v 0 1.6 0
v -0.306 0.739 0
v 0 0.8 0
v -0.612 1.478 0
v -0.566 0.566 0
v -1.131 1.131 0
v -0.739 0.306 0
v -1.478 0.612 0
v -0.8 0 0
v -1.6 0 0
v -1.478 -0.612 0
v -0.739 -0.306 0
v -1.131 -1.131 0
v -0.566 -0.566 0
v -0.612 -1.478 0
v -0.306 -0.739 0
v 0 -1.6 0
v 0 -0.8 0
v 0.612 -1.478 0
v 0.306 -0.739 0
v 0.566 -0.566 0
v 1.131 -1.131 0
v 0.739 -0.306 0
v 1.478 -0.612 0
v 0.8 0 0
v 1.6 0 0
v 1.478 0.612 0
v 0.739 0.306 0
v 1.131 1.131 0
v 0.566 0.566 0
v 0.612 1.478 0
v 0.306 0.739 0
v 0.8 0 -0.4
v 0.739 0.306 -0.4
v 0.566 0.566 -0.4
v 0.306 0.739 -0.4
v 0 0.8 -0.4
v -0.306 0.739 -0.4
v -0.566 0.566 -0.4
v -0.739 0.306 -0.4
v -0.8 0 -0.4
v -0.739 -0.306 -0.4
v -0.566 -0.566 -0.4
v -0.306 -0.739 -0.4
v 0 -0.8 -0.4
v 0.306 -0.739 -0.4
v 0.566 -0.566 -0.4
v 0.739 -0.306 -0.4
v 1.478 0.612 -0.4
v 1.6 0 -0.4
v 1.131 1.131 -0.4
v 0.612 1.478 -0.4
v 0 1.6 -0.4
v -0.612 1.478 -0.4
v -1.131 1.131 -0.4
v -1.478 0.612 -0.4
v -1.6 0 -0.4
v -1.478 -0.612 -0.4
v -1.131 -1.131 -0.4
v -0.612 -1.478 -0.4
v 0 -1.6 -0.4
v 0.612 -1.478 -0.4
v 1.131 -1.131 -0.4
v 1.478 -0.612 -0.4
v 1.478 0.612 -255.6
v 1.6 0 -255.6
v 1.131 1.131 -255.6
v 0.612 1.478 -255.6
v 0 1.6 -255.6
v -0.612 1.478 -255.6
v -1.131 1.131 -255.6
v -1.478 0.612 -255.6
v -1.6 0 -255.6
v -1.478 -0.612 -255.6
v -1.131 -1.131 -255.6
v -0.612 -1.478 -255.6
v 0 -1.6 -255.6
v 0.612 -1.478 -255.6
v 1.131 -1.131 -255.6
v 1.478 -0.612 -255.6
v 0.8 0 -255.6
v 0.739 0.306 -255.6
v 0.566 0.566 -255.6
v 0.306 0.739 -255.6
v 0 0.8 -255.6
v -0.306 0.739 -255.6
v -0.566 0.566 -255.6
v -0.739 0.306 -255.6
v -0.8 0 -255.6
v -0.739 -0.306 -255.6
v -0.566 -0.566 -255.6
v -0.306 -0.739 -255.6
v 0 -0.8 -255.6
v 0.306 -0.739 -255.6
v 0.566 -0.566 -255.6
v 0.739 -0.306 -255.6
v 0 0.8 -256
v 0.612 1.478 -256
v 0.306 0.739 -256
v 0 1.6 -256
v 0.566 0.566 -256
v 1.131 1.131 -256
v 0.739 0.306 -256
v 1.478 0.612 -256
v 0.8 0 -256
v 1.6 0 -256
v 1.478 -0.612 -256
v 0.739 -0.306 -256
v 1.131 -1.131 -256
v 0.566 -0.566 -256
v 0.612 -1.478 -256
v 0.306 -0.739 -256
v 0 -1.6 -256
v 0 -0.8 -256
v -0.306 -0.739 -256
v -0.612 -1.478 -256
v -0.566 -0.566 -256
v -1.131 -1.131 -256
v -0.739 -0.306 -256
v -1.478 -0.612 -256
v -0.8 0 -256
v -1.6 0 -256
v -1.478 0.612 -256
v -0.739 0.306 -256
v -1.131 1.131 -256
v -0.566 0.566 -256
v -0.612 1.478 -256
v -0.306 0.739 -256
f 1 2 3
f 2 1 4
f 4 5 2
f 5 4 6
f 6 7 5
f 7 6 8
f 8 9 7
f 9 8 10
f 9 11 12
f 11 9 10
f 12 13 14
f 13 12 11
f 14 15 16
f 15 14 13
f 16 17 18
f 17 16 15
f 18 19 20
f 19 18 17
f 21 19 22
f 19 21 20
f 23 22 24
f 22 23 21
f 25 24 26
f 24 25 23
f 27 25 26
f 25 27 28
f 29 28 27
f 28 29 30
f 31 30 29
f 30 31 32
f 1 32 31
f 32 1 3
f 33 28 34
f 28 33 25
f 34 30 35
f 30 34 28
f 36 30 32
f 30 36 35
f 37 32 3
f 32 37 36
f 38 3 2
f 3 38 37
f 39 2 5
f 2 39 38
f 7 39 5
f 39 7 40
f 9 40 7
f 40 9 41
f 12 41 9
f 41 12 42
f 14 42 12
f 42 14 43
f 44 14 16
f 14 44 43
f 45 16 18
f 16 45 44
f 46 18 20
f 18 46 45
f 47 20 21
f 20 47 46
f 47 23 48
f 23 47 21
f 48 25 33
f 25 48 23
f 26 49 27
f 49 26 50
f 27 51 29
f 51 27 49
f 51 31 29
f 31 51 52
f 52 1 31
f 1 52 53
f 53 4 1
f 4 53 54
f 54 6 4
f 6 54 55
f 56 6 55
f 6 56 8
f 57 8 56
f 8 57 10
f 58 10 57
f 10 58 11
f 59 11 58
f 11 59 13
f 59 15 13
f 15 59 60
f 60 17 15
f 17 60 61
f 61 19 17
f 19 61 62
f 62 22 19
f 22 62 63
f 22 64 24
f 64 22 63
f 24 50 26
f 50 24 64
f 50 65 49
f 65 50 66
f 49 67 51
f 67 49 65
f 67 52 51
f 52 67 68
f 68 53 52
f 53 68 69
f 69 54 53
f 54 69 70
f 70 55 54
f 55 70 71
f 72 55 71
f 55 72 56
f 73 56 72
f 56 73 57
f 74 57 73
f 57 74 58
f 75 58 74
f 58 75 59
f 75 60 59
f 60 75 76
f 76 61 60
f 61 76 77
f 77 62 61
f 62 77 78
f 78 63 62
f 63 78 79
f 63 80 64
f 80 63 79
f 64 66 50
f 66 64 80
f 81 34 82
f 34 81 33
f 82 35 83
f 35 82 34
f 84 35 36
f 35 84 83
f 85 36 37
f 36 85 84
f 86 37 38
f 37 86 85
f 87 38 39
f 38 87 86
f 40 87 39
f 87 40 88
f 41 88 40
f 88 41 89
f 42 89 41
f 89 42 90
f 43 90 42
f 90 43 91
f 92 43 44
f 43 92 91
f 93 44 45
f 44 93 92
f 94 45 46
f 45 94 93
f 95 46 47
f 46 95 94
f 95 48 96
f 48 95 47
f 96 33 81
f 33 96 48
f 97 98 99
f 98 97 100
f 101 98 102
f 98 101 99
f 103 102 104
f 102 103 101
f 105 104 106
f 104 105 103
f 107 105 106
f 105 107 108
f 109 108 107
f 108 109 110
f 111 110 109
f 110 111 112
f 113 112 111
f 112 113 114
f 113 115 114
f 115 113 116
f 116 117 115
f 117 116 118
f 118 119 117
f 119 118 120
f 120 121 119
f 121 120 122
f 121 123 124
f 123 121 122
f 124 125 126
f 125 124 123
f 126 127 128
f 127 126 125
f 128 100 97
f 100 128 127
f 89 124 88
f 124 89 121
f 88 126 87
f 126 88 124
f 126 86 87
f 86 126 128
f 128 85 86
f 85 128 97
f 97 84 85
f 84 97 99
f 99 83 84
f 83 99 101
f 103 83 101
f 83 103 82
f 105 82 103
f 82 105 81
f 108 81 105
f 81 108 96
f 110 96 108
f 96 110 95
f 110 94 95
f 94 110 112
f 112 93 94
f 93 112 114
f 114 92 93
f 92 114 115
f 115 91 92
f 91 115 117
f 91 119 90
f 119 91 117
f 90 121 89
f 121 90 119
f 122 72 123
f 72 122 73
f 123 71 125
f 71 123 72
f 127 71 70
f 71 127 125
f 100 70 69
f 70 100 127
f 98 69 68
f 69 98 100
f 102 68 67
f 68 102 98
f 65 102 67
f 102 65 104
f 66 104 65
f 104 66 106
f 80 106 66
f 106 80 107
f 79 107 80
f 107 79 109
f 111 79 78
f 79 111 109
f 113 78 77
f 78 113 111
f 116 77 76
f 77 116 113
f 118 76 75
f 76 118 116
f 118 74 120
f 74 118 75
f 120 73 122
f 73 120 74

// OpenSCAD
// file: ../p/4-4ring1.scad
use <../lib.scad>
function ldraw_lib__4_4ring1() = [
// 0 Ring  1 x 1.0
// 0 Name: 4-4ring1.dat
// 0 Author: James Jessiman
// 0 !LDRAW_ORG Primitive UPDATE 2009-01
// 0 !LICENSE Licensed under CC BY 2.0 and CC BY 4.0 : see CAreadme.txt
// 
// 0 BFC CERTIFY CCW
  [0,"BFC","CERTIFY"],
  [0,"BFC","CCW"],
// 
// 0 !HISTORY 1998-12-15 [PTadmin] Official Update 1998-10
// 0 !HISTORY 2002-04-08 [BrickCaster] Modified for BFC compliance
// 0 !HISTORY 2002-04-25 [PTadmin] Official Update 2002-02
// 0 !HISTORY 2007-06-24 [PTadmin] Header formatted for Contributor Agreement
// 0 !HISTORY 2008-07-01 [PTadmin] Official Update 2008-01
// 0 !HISTORY 2008-08-26 [cwdee] Switch polygon winding and rename
// 0 !HISTORY 2009-05-02 [PTadmin] Official Update 2009-01
// 
// 
// 4 16 -0.7654 0 1.8478 -0.3827 0 0.9239 0 0 1 0 0 2
  [4,16,-0.7654,0,1.8478,-0.3827,0,0.9239,0,0,1,0,0,2],
// 4 16 -1.4142 0 1.4142 -0.7071 0 0.7071 -0.3827 0 0.9239 -0.7654 0 1.8478
  [4,16,-1.4142,0,1.4142,-0.7071,0,0.7071,-0.3827,0,0.9239,-0.7654,0,1.8478],
// 4 16 -1.8478 0 0.7654 -0.9239 0 0.3827 -0.7071 0 0.7071 -1.4142 0 1.41420
  [4,16,-1.8478,0,0.7654,-0.9239,0,0.3827,-0.7071,0,0.7071,-1.4142,0,1.41420],
// 4 16 -2 0 0 -1 0 0 -0.9239 0 0.3827 -1.8478 0 0.7654
  [4,16,-2,0,0,-1,0,0,-0.9239,0,0.3827,-1.8478,0,0.7654],
// 4 16 -1.8478 0 -0.7654 -0.9239 0 -0.3827 -1 0 0 -2 0 0
  [4,16,-1.8478,0,-0.7654,-0.9239,0,-0.3827,-1,0,0,-2,0,0],
// 4 16 -1.4142 0 -1.4142 -0.7071 0 -0.7071 -0.9239 0 -0.3827 -1.8478 0 -0.7654
  [4,16,-1.4142,0,-1.4142,-0.7071,0,-0.7071,-0.9239,0,-0.3827,-1.8478,0,-0.7654],
// 4 16 -0.7654 0 -1.8478 -0.3827 0 -0.9239 -0.7071 0 -0.7071 -1.4142 0 -1.4142
  [4,16,-0.7654,0,-1.8478,-0.3827,0,-0.9239,-0.7071,0,-0.7071,-1.4142,0,-1.4142],
// 4 16 0 0 -2 0 0 -1 -0.3827 0 -0.9239 -0.7654 0 -1.8478
  [4,16,0,0,-2,0,0,-1,-0.3827,0,-0.9239,-0.7654,0,-1.8478],
// 4 16 0.7654 0 -1.8478 0.3827 0 -0.9239 0 0 -1 0 0 -2
  [4,16,0.7654,0,-1.8478,0.3827,0,-0.9239,0,0,-1,0,0,-2],
// 4 16 1.4142 0 -1.4142 0.7071 0 -0.7071 0.3827 0 -0.9239 0.7654 0 -1.8478
  [4,16,1.4142,0,-1.4142,0.7071,0,-0.7071,0.3827,0,-0.9239,0.7654,0,-1.8478],
// 4 16 1.8478 0 -0.7654 0.9239 0 -0.3827 0.7071 0 -0.7071 1.4142 0 -1.4142
  [4,16,1.8478,0,-0.7654,0.9239,0,-0.3827,0.7071,0,-0.7071,1.4142,0,-1.4142],
// 4 16 2 0 0 1 0 0 0.9239 0 -0.3827 1.8478 0 -0.7654
  [4,16,2,0,0,1,0,0,0.9239,0,-0.3827,1.8478,0,-0.7654],
// 4 16 1.8478 0 0.7654 0.9239 0 0.3827 1 0 0 2 0 0
  [4,16,1.8478,0,0.7654,0.9239,0,0.3827,1,0,0,2,0,0],
// 4 16 1.4142 0 1.4142 0.7071 0 0.7071 0.9239 0 0.3827 1.8478 0 0.7654
  [4,16,1.4142,0,1.4142,0.7071,0,0.7071,0.9239,0,0.3827,1.8478,0,0.7654],
// 4 16 0.7654 0 1.8478 0.3827 0 0.9239 0.7071 0 0.7071 1.4142 0 1.4142
  [4,16,0.7654,0,1.8478,0.3827,0,0.9239,0.7071,0,0.7071,1.4142,0,1.4142],
// 4 16 0 0 2 0 0 1 0.3827 0 0.9239 0.7654 0 1.8478
  [4,16,0,0,2,0,0,1,0.3827,0,0.9239,0.7654,0,1.8478],
// 0
];
module ldraw_lib__4_4ring1(step=0, col=false, unit=2/5, alt=false, line=0.2, solid=!$preview)
    makepoly(ldraw_lib__4_4ring1(), step=step, col=col, unit=unit, alt=alt, line=line, solid=solid);
ldraw_lib__4_4ring1(line=0.2);
// file: ../p/4-4edge.scad
use <../lib.scad>
function ldraw_lib__4_4edge() = [
// 0 Circle 1.0
// 0 Name: 4-4edge.dat
// 0 Author: James Jessiman
// 0 !LDRAW_ORG Primitive UPDATE 2017-01
// 0 !LICENSE Licensed under CC BY 4.0 : see CAreadme.txt
// 
// 0 BFC CERTIFY CCW
  [0,"BFC","CERTIFY"],
  [0,"BFC","CCW"],
// 
// 0 !HISTORY 1998-12-15 [PTadmin] Official Update 1998-10
// 0 !HISTORY 2005-12-28 [PTadmin] Official Update 2005-01
// 0 !HISTORY 2007-06-24 [PTadmin] Header formatted for Contributor Agreement
// 0 !HISTORY 2008-07-01 [PTadmin] Official Update 2008-01
// 0 !HISTORY 2017-01-15 [Steffen] BFCed
// 0 !HISTORY 2017-12-30 [PTadmin] Official Update 2017-01
// 
// 
// 2 24 1 0 0 0.9239 0 0.3827
  [2,24,1,0,0,0.9239,0,0.3827],
// 2 24 0.9239 0 0.3827 0.7071 0 0.7071
  [2,24,0.9239,0,0.3827,0.7071,0,0.7071],
// 2 24 0.7071 0 0.7071 0.3827 0 0.9239
  [2,24,0.7071,0,0.7071,0.3827,0,0.9239],
// 2 24 0.3827 0 0.9239 0 0 1
  [2,24,0.3827,0,0.9239,0,0,1],
// 2 24 0 0 1 -0.3827 0 0.9239
  [2,24,0,0,1,-0.3827,0,0.9239],
// 2 24 -0.3827 0 0.9239 -0.7071 0 0.7071
  [2,24,-0.3827,0,0.9239,-0.7071,0,0.7071],
// 2 24 -0.7071 0 0.7071 -0.9239 0 0.3827
  [2,24,-0.7071,0,0.7071,-0.9239,0,0.3827],
// 2 24 -0.9239 0 0.3827 -1 0 -0
  [2,24,-0.9239,0,0.3827,-1,0,-0],
// 2 24 -1 0 -0 -0.9239 0 -0.3827
  [2,24,-1,0,-0,-0.9239,0,-0.3827],
// 2 24 -0.9239 0 -0.3827 -0.7071 0 -0.7071
  [2,24,-0.9239,0,-0.3827,-0.7071,0,-0.7071],
// 2 24 -0.7071 0 -0.7071 -0.3827 0 -0.9239
  [2,24,-0.7071,0,-0.7071,-0.3827,0,-0.9239],
// 2 24 -0.3827 0 -0.9239 0 0 -1
  [2,24,-0.3827,0,-0.9239,0,0,-1],
// 2 24 0 0 -1 0.3827 0 -0.9239
  [2,24,0,0,-1,0.3827,0,-0.9239],
// 2 24 0.3827 0 -0.9239 0.7071 0 -0.7071
  [2,24,0.3827,0,-0.9239,0.7071,0,-0.7071],
// 2 24 0.7071 0 -0.7071 0.9239 0 -0.3827
  [2,24,0.7071,0,-0.7071,0.9239,0,-0.3827],
// 2 24 0.9239 0 -0.3827 1 0 0
  [2,24,0.9239,0,-0.3827,1,0,0],
];
module ldraw_lib__4_4edge(step=0, col=false, unit=2/5, alt=false, line=0.2, solid=!$preview)
    makepoly(ldraw_lib__4_4edge(), step=step, col=col, unit=unit, alt=alt, line=line, solid=solid);
ldraw_lib__4_4edge(line=0.2);
// file: ../p/4-4cyli.scad
use <../lib.scad>
function ldraw_lib__4_4cyli() = [
// 0 Cylinder 1.0
// 0 Name: 4-4cyli.dat
// 0 Author: James Jessiman
// 0 !LDRAW_ORG Primitive UPDATE 2005-01
// 0 !LICENSE Licensed under CC BY 2.0 and CC BY 4.0 : see CAreadme.txt
// 
// 0 BFC CERTIFY CCW
  [0,"BFC","CERTIFY"],
  [0,"BFC","CCW"],
// 
// 0 !HISTORY 1998-12-15 [PTadmin] Official Update 1998-10
// 0 !HISTORY 2002-03-23 [sbliss] Added BFC statement; merged headers from files in distributions LDraw 0.27 and Complete.
// 0 !HISTORY 2002-04-25 [PTadmin] Official Update 2002-02
// 0 !HISTORY 2004-12-14 [guyvivan] BFC CCW
// 0 !HISTORY 2005-12-28 [PTadmin] Official Update 2005-01
// 0 !HISTORY 2007-06-24 [PTadmin] Header formatted for Contributor Agreement
// 0 !HISTORY 2008-07-01 [PTadmin] Official Update 2008-01
// 
// 
// 4 16 1 1 0 0.9239 1 0.3827 0.9239 0 0.3827 1 0 0
  [4,16,1,1,0,0.9239,1,0.3827,0.9239,0,0.3827,1,0,0],
// 5 24 1 0 0 1 1 0 0.9239 0 0.3827 0.9239 0 -0.3827
  [5,24,1,0,0,1,1,0,0.9239,0,0.3827,0.9239,0,-0.3827],
// 4 16 0.9239 1 0.3827 0.7071 1 0.7071 0.7071 0 0.7071 0.9239 0 0.3827
  [4,16,0.9239,1,0.3827,0.7071,1,0.7071,0.7071,0,0.7071,0.9239,0,0.3827],
// 5 24 0.9239 0 0.3827 0.9239 1 0.3827 0.7071 0 0.7071 1 0 0
  [5,24,0.9239,0,0.3827,0.9239,1,0.3827,0.7071,0,0.7071,1,0,0],
// 4 16 0.7071 1 0.7071 0.3827 1 0.9239 0.3827 0 0.9239 0.7071 0 0.7071
  [4,16,0.7071,1,0.7071,0.3827,1,0.9239,0.3827,0,0.9239,0.7071,0,0.7071],
// 5 24 0.7071 0 0.7071 0.7071 1 0.7071 0.3827 0 0.9239 0.9239 0 0.3827
  [5,24,0.7071,0,0.7071,0.7071,1,0.7071,0.3827,0,0.9239,0.9239,0,0.3827],
// 4 16 0.3827 1 0.9239 0 1 1 0 0 1 0.3827 0 0.9239
  [4,16,0.3827,1,0.9239,0,1,1,0,0,1,0.3827,0,0.9239],
// 5 24 0.3827 0 0.9239 0.3827 1 0.9239 0 0 1 0.7071 0 0.7071
  [5,24,0.3827,0,0.9239,0.3827,1,0.9239,0,0,1,0.7071,0,0.7071],
// 4 16 0 1 1 -0.3827 1 0.9239 -0.3827 0 0.9239 0 0 1
  [4,16,0,1,1,-0.3827,1,0.9239,-0.3827,0,0.9239,0,0,1],
// 5 24 0 0 1 0 1 1 -0.3827 0 0.9239 0.3827 0 0.9239
  [5,24,0,0,1,0,1,1,-0.3827,0,0.9239,0.3827,0,0.9239],
// 4 16 -0.3827 1 0.9239 -0.7071 1 0.7071 -0.7071 0 0.7071 -0.3827 0 0.9239
  [4,16,-0.3827,1,0.9239,-0.7071,1,0.7071,-0.7071,0,0.7071,-0.3827,0,0.9239],
// 5 24 -0.3827 0 0.9239 -0.3827 1 0.9239 -0.7071 0 0.7071 0 0 1
  [5,24,-0.3827,0,0.9239,-0.3827,1,0.9239,-0.7071,0,0.7071,0,0,1],
// 4 16 -0.7071 1 0.7071 -0.9239 1 0.3827 -0.9239 0 0.3827 -0.7071 0 0.7071
  [4,16,-0.7071,1,0.7071,-0.9239,1,0.3827,-0.9239,0,0.3827,-0.7071,0,0.7071],
// 5 24 -0.7071 0 0.7071 -0.7071 1 0.7071 -0.9239 0 0.3827 -0.3827 0 0.9239
  [5,24,-0.7071,0,0.7071,-0.7071,1,0.7071,-0.9239,0,0.3827,-0.3827,0,0.9239],
// 4 16 -0.9239 1 0.3827 -1 1 0 -1 0 0 -0.9239 0 0.3827
  [4,16,-0.9239,1,0.3827,-1,1,0,-1,0,0,-0.9239,0,0.3827],
// 5 24 -0.9239 0 0.3827 -0.9239 1 0.3827 -1 0 0 -0.7071 0 0.7071
  [5,24,-0.9239,0,0.3827,-0.9239,1,0.3827,-1,0,0,-0.7071,0,0.7071],
// 4 16 -1 1 0 -0.9239 1 -0.3827 -0.9239 0 -0.3827 -1 0 0
  [4,16,-1,1,0,-0.9239,1,-0.3827,-0.9239,0,-0.3827,-1,0,0],
// 5 24 -1 0 0 -1 1 0 -0.9239 0 -0.3827 -0.9239 0 0.3827
  [5,24,-1,0,0,-1,1,0,-0.9239,0,-0.3827,-0.9239,0,0.3827],
// 4 16 -0.9239 1 -0.3827 -0.7071 1 -0.7071 -0.7071 0 -0.7071 -0.9239 0 -0.3827
  [4,16,-0.9239,1,-0.3827,-0.7071,1,-0.7071,-0.7071,0,-0.7071,-0.9239,0,-0.3827],
// 5 24 -0.9239 0 -0.3827 -0.9239 1 -0.3827 -0.7071 0 -0.7071 -1 0 0
  [5,24,-0.9239,0,-0.3827,-0.9239,1,-0.3827,-0.7071,0,-0.7071,-1,0,0],
// 4 16 -0.7071 1 -0.7071 -0.3827 1 -0.9239 -0.3827 0 -0.9239 -0.7071 0 -0.7071
  [4,16,-0.7071,1,-0.7071,-0.3827,1,-0.9239,-0.3827,0,-0.9239,-0.7071,0,-0.7071],
// 5 24 -0.7071 0 -0.7071 -0.7071 1 -0.7071 -0.3827 0 -0.9239 -0.9239 0 -0.3827
  [5,24,-0.7071,0,-0.7071,-0.7071,1,-0.7071,-0.3827,0,-0.9239,-0.9239,0,-0.3827],
// 4 16 -0.3827 1 -0.9239 0 1 -1 0 0 -1 -0.3827 0 -0.9239
  [4,16,-0.3827,1,-0.9239,0,1,-1,0,0,-1,-0.3827,0,-0.9239],
// 5 24 -0.3827 0 -0.9239 -0.3827 1 -0.9239 0 0 -1 -0.7071 0 -0.7071
  [5,24,-0.3827,0,-0.9239,-0.3827,1,-0.9239,0,0,-1,-0.7071,0,-0.7071],
// 4 16 0 1 -1 0.3827 1 -0.9239 0.3827 0 -0.9239 0 0 -1
  [4,16,0,1,-1,0.3827,1,-0.9239,0.3827,0,-0.9239,0,0,-1],
// 5 24 0 0 -1 0 1 -1 0.3827 0 -0.9239 -0.3827 0 -0.9239
  [5,24,0,0,-1,0,1,-1,0.3827,0,-0.9239,-0.3827,0,-0.9239],
// 4 16 0.3827 1 -0.9239 0.7071 1 -0.7071 0.7071 0 -0.7071 0.3827 0 -0.9239
  [4,16,0.3827,1,-0.9239,0.7071,1,-0.7071,0.7071,0,-0.7071,0.3827,0,-0.9239],
// 5 24 0.3827 0 -0.9239 0.3827 1 -0.9239 0.7071 0 -0.7071 0 0 -1
  [5,24,0.3827,0,-0.9239,0.3827,1,-0.9239,0.7071,0,-0.7071,0,0,-1],
// 4 16 0.7071 1 -0.7071 0.9239 1 -0.3827 0.9239 0 -0.3827 0.7071 0 -0.7071
  [4,16,0.7071,1,-0.7071,0.9239,1,-0.3827,0.9239,0,-0.3827,0.7071,0,-0.7071],
// 5 24 0.7071 0 -0.7071 0.7071 1 -0.7071 0.9239 0 -0.3827 0.3827 0 -0.9239
  [5,24,0.7071,0,-0.7071,0.7071,1,-0.7071,0.9239,0,-0.3827,0.3827,0,-0.9239],
// 4 16 0.9239 1 -0.3827 1 1 0 1 0 0 0.9239 0 -0.3827
  [4,16,0.9239,1,-0.3827,1,1,0,1,0,0,0.9239,0,-0.3827],
// 5 24 0.9239 0 -0.3827 0.9239 1 -0.3827 1 0 0 0.7071 0 -0.7071
  [5,24,0.9239,0,-0.3827,0.9239,1,-0.3827,1,0,0,0.7071,0,-0.7071],
// 0
];
module ldraw_lib__4_4cyli(step=0, col=false, unit=2/5, alt=false, line=0.2, solid=!$preview)
    makepoly(ldraw_lib__4_4cyli(), step=step, col=col, unit=unit, alt=alt, line=line, solid=solid);
ldraw_lib__4_4cyli(line=0.2);
// file: u9053.scad
use <../lib.scad>
use <../p/4-4cyli.scad>
use <../p/4-4edge.scad>
use <../p/4-4ring1.scad>
function ldraw_lib__u9053() = [
// 0 ~Technic Flex-System Hose End
// 0 Name: u9053.dat
// 0 Author: William Howard [WilliamH]
// 0 !LDRAW_ORG Part UPDATE 2011-02
// 0 !LICENSE Licensed under CC BY 2.0 and CC BY 4.0 : see CAreadme.txt
// 
// 0 BFC CERTIFY CCW
  [0,"BFC","CERTIFY"],
  [0,"BFC","CCW"],
// 
// 0 !HISTORY 2011-12-21 [cwdee] Reworked subparting technique
// 0 !HISTORY 2011-12-23 [PTadmin] Renamed from 76
// 0 !HISTORY 2011-12-29 [PTadmin] Official Update 2011-02
// 
// 
// 1 16 0 0 0 2 0 0 0 1 0 0 0 2 4-4ring1.dat
  [1,16,0,0,0,2,0,0,0,1,0,0,0,2, ldraw_lib__4_4ring1()],
// 1 16 0 0 0 2 0 0 0 1 0 0 0 2 4-4edge.dat
  [1,16,0,0,0,2,0,0,0,1,0,0,0,2, ldraw_lib__4_4edge()],
// 0 BFC INVERTNEXT
  [0,"BFC","INVERTNEXT"],
// 1 16 0 0 0 2 0 0 0 1 0 0 0 2 4-4cyli.dat
  [1,16,0,0,0,2,0,0,0,1,0,0,0,2, ldraw_lib__4_4cyli()],
// 1 16 0 0 0 4 0 0 0 1 0 0 0 4 4-4edge.dat
  [1,16,0,0,0,4,0,0,0,1,0,0,0,4, ldraw_lib__4_4edge()],
// 1 16 0 0 0 4 0 0 0 1 0 0 0 4 4-4cyli.dat
  [1,16,0,0,0,4,0,0,0,1,0,0,0,4, ldraw_lib__4_4cyli()],
// 0
];
module ldraw_lib__u9053(step=0, col=false, unit=2/5, alt=false, line=0.2, solid=!$preview)
    makepoly(ldraw_lib__u9053(), step=step, col=col, unit=unit, alt=alt, line=line, solid=solid);
ldraw_lib__u9053(line=0.2);
// file: 77.scad
use <../lib.scad>
use <../p/4-4cyli.scad>
function ldraw_lib__77() = [
// 0 ~Technic Flex-System Hose Segment
// 0 Name: 77.dat
// 0 Author: William Howard [WilliamH]
// 0 !LDRAW_ORG Part UPDATE 2011-02
// 0 !LICENSE Licensed under CC BY 2.0 and CC BY 4.0 : see CAreadme.txt
// 
// 0 BFC CERTIFY CCW
  [0,"BFC","CERTIFY"],
  [0,"BFC","CCW"],
// 
// 0 !HISTORY 2011-12-21 [cwdee] Reworked subparting technique
// 0 !HISTORY 2011-12-29 [PTadmin] Official Update 2011-02
// 
// 
// 1 16 0 0 0 4 0 0 0 1 0 0 0 4 4-4cyli.dat
  [1,16,0,0,0,4,0,0,0,1,0,0,0,4, ldraw_lib__4_4cyli()],
// 0 BFC INVERTNEXT
  [0,"BFC","INVERTNEXT"],
// 1 16 0 0 0 2 0 0 0 1 0 0 0 2 4-4cyli.dat
  [1,16,0,0,0,2,0,0,0,1,0,0,0,2, ldraw_lib__4_4cyli()],
// 0
];
module ldraw_lib__77(step=0, col=false, unit=2/5, alt=false, line=0.2, solid=!$preview)
    makepoly(ldraw_lib__77(), step=step, col=col, unit=unit, alt=alt, line=line, solid=solid);
ldraw_lib__77(line=0.2);
// main file
use <../lib.scad>
use <77.scad>
use <u9053.scad>
function ldraw_lib__57274() = [
// 0 Technic Flex-System Hose 32L (640LDU)
// 0 Name: 57274.dat
// 0 Author: Tim Gould [timgould]
// 0 !LDRAW_ORG Part UPDATE 2011-02
// 0 !LICENSE Licensed under CC BY 4.0 : see CAreadme.txt
// 
// 0 BFC CERTIFY CCW
  [0,"BFC","CERTIFY"],
  [0,"BFC","CCW"],
// 
// 0 !KEYWORDS bar, tube
// 
// 0 !HISTORY 2011-12-29 [PTadmin] Official Update 2011-02
// 
// 
// 1 16 0 0 0 1 0 0 0 1 0 0 0 1 u9053.dat
  [1,16,0,0,0,1,0,0,0,1,0,0,0,1, ldraw_lib__u9053()],
// 1 16 0 1 0 1 0 0 0 638 0 0 0 1 77.dat
  [1,16,0,1,0,1,0,0,0,638,0,0,0,1, ldraw_lib__77()],
// 1 16 0 640 0 -1 0 0 0 -1 0 0 0 1 u9053.dat
  [1,16,0,640,0,-1,0,0,0,-1,0,0,0,1, ldraw_lib__u9053()],
];
module ldraw_lib__57274(step=0, col=false, unit=2/5, alt=false, line=0.2, solid=!$preview)
    makepoly(ldraw_lib__57274(), step=step, col=col, unit=unit, alt=alt, line=line, solid=solid);
ldraw_lib__57274(line=0.2);
